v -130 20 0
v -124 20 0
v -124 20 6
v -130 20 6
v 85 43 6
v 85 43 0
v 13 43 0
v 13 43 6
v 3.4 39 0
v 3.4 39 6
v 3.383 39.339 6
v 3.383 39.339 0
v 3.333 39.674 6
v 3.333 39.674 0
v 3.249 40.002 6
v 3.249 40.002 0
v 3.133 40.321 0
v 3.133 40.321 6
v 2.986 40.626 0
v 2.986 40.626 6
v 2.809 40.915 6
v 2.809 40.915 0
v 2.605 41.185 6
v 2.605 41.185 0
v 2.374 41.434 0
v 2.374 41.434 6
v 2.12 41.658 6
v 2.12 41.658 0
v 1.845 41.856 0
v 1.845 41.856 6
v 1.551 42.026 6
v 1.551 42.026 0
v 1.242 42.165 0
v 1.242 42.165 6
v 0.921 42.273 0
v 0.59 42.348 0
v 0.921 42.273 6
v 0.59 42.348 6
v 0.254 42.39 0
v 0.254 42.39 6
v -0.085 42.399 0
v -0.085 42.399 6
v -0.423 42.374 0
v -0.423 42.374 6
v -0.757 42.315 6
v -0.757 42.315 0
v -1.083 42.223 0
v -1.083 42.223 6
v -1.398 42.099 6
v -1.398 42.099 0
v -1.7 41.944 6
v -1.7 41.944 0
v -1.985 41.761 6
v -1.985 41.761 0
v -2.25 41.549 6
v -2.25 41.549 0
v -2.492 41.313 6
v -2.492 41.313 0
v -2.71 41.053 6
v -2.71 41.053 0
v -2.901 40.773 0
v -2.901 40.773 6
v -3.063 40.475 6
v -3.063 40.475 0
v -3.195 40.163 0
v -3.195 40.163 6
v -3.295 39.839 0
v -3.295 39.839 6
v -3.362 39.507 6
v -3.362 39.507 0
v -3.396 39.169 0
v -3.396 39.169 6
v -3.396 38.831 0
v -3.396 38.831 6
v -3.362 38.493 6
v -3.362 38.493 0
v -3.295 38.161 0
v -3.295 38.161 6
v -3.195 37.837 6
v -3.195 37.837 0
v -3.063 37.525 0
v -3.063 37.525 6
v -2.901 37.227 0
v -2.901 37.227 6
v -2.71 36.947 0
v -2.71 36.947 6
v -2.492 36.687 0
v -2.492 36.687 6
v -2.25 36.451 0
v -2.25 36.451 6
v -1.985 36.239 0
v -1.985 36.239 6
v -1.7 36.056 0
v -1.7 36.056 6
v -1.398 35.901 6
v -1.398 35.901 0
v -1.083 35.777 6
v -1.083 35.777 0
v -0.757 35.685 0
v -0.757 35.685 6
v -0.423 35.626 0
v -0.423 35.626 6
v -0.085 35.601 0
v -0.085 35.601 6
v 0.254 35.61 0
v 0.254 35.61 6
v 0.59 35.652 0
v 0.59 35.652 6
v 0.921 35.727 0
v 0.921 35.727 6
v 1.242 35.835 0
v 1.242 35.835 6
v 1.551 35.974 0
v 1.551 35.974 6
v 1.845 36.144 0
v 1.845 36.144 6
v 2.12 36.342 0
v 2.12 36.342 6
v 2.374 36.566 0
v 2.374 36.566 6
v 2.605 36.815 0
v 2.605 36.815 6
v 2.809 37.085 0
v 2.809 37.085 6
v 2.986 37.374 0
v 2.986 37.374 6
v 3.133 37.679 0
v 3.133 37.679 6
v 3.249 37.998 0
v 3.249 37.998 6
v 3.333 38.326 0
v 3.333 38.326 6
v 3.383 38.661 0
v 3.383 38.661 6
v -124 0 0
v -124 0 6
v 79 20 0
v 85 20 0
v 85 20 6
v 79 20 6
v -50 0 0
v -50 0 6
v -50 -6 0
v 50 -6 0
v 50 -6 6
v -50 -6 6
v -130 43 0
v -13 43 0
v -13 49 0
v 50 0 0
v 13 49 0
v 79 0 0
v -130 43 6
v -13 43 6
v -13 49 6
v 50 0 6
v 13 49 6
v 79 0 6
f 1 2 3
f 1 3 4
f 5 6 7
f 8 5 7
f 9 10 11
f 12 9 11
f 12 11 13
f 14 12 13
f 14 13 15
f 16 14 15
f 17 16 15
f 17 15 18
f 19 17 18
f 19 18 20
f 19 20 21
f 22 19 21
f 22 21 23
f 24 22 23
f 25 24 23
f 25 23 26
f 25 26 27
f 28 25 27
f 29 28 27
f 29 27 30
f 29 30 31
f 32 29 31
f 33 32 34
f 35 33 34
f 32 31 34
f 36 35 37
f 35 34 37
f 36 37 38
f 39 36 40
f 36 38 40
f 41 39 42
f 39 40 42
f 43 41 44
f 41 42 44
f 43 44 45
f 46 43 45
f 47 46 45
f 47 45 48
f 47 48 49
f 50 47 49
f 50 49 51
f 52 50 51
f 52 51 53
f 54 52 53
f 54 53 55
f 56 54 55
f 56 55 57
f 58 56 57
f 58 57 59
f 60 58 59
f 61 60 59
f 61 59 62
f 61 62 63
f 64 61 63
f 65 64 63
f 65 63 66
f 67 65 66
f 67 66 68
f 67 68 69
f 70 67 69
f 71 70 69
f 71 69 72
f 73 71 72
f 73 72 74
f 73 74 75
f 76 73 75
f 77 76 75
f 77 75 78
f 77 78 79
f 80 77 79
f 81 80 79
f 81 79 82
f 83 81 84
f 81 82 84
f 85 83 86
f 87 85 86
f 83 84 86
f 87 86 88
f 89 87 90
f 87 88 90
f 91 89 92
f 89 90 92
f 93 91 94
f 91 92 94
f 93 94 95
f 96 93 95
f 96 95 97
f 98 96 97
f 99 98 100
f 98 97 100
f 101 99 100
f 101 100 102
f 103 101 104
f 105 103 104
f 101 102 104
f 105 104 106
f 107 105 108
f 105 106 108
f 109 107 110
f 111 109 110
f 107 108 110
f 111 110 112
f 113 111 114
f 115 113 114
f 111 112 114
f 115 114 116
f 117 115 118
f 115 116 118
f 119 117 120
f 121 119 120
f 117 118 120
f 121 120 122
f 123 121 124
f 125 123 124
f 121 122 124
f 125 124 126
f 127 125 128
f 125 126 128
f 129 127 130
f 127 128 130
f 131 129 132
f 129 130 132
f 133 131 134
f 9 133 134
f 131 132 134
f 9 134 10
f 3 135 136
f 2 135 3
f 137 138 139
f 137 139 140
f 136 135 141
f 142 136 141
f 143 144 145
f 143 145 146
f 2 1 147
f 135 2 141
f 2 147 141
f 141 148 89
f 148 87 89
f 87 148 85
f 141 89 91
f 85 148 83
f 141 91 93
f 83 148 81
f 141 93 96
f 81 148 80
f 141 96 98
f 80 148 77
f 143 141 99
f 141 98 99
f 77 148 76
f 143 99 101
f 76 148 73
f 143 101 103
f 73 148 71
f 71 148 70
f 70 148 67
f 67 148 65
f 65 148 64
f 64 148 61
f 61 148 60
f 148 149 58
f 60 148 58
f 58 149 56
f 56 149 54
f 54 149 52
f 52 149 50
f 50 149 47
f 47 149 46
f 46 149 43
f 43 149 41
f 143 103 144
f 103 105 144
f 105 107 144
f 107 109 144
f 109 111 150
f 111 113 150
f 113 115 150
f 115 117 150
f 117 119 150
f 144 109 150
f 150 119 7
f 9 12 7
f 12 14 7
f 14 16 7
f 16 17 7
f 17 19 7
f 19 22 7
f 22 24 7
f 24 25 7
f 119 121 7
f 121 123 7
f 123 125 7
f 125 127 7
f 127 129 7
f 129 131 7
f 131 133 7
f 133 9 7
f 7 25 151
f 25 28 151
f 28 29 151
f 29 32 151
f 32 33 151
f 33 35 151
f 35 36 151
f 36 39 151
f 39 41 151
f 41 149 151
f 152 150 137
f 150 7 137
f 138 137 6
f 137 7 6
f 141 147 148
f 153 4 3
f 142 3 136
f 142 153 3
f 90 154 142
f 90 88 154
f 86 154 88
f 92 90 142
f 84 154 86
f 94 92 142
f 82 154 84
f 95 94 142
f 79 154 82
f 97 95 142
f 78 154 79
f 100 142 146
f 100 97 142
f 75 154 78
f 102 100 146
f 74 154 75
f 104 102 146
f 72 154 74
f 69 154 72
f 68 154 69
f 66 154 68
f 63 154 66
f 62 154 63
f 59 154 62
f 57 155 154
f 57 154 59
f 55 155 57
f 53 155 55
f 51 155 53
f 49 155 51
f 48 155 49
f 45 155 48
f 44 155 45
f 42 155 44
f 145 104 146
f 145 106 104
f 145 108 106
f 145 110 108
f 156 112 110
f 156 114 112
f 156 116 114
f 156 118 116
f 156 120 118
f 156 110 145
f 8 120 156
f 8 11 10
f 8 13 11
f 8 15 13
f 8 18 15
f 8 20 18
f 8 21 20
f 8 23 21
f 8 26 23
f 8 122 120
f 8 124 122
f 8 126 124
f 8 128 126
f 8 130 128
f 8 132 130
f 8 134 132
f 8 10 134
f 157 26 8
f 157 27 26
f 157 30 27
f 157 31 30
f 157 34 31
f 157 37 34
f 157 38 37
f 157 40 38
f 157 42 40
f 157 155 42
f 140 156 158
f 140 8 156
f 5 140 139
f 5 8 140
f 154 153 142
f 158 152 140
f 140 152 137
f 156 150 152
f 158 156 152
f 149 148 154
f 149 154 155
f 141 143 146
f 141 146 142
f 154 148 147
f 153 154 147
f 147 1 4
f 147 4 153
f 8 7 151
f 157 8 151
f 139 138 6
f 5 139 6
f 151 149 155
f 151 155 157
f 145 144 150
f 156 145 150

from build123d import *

# Parameters (mm, degrees)
SKETCH1_W              = 215
SKETCH1_H              = 49
BOSS_EXTRUDE1_DEPTH    = 6
CUT_EXTRUDE1_REACH     = 141.058
SKETCH2_W              = 72
SKETCH2_H              = 6
SKETCH2_W_2            = 117
M8X1_25_TAPPED_HOLE1_D = 6.8
CUT_EXTRUDE2_REACH     = 141.058
SKETCH5_W              = 6
SKETCH5_H              = 20
SKETCH6_W              = 100
SKETCH6_H              = 6
BOSS_EXTRUDE2_DEPTH    = 6


with BuildPart() as part:
    # Sketch1 → Boss-Extrude1 (new body)
    with BuildSketch(Plane.XY):
        with Locations((-22.5, 24.5)):
            Rectangle(SKETCH1_W, SKETCH1_H)
    extrude(amount=BOSS_EXTRUDE1_DEPTH)

    # Sketch2 → Cut-Extrude1 (cut, up to next)
    with BuildSketch(Plane(origin=(0, 0, 0), x_dir=(-1, 0, 0), z_dir=(0, 0, -1)), mode=Mode.PRIVATE) as cut_extrude1_sk1:
        with Locations((-49, 46)):
            Rectangle(SKETCH2_W, SKETCH2_H)
    cut_extrude1_tool1 = extrude(cut_extrude1_sk1.sketch, amount=-CUT_EXTRUDE1_REACH, mode=Mode.PRIVATE) & part.part
    # Sketch2 → Cut-Extrude1 (cut, up to next)
    with BuildSketch(Plane(origin=(0, 0, 0), x_dir=(-1, 0, 0), z_dir=(0, 0, -1)), mode=Mode.PRIVATE) as cut_extrude1_sk2:
        with Locations((71.5, 46)):
            Rectangle(SKETCH2_W_2, SKETCH2_H)
    cut_extrude1_tool2 = extrude(cut_extrude1_sk2.sketch, amount=-CUT_EXTRUDE1_REACH, mode=Mode.PRIVATE) & part.part
    add(cut_extrude1_tool1.solids().sort_by_distance((49, 46, 0))[0], mode=Mode.SUBTRACT)
    add(cut_extrude1_tool2.solids().sort_by_distance((-71.5, 46, 0))[0], mode=Mode.SUBTRACT)

    # M8x1.25 Tapped Hole1 (through all)
    with Locations(Plane(origin=(0, 0, 0), x_dir=(-1, 0, 0), z_dir=(0, 0, -1))):
        with Locations((0, 39)):
            Hole(M8X1_25_TAPPED_HOLE1_D / 2)

    # Sketch5 → Cut-Extrude2 (cut, up to next)
    with BuildSketch(Plane(origin=(0, 0, 0), x_dir=(-1, 0, 0), z_dir=(0, 0, -1)), mode=Mode.PRIVATE) as cut_extrude2_sk1:
        with Locations((-82, 10)):
            Rectangle(SKETCH5_W, SKETCH5_H)
    cut_extrude2_tool1 = extrude(cut_extrude2_sk1.sketch, amount=-CUT_EXTRUDE2_REACH, mode=Mode.PRIVATE) & part.part
    # Sketch5 → Cut-Extrude2 (cut, up to next)
    with BuildSketch(Plane(origin=(0, 0, 0), x_dir=(-1, 0, 0), z_dir=(0, 0, -1)), mode=Mode.PRIVATE) as cut_extrude2_sk2:
        with Locations((127, 10)):
            Rectangle(SKETCH5_W, SKETCH5_H)
    cut_extrude2_tool2 = extrude(cut_extrude2_sk2.sketch, amount=-CUT_EXTRUDE2_REACH, mode=Mode.PRIVATE) & part.part
    add(cut_extrude2_tool1.solids().sort_by_distance((82, 10, 0))[0], mode=Mode.SUBTRACT)
    add(cut_extrude2_tool2.solids().sort_by_distance((-127, 10, 0))[0], mode=Mode.SUBTRACT)

    # Sketch6 → Boss-Extrude2 (add)
    with BuildSketch(Plane(origin=(0, 0, 0), x_dir=(-1, 0, 0), z_dir=(0, 0, -1))):
        with Locations((0, -3)):
            Rectangle(SKETCH6_W, SKETCH6_H)
    extrude(amount=-BOSS_EXTRUDE2_DEPTH)


solid = part.part
